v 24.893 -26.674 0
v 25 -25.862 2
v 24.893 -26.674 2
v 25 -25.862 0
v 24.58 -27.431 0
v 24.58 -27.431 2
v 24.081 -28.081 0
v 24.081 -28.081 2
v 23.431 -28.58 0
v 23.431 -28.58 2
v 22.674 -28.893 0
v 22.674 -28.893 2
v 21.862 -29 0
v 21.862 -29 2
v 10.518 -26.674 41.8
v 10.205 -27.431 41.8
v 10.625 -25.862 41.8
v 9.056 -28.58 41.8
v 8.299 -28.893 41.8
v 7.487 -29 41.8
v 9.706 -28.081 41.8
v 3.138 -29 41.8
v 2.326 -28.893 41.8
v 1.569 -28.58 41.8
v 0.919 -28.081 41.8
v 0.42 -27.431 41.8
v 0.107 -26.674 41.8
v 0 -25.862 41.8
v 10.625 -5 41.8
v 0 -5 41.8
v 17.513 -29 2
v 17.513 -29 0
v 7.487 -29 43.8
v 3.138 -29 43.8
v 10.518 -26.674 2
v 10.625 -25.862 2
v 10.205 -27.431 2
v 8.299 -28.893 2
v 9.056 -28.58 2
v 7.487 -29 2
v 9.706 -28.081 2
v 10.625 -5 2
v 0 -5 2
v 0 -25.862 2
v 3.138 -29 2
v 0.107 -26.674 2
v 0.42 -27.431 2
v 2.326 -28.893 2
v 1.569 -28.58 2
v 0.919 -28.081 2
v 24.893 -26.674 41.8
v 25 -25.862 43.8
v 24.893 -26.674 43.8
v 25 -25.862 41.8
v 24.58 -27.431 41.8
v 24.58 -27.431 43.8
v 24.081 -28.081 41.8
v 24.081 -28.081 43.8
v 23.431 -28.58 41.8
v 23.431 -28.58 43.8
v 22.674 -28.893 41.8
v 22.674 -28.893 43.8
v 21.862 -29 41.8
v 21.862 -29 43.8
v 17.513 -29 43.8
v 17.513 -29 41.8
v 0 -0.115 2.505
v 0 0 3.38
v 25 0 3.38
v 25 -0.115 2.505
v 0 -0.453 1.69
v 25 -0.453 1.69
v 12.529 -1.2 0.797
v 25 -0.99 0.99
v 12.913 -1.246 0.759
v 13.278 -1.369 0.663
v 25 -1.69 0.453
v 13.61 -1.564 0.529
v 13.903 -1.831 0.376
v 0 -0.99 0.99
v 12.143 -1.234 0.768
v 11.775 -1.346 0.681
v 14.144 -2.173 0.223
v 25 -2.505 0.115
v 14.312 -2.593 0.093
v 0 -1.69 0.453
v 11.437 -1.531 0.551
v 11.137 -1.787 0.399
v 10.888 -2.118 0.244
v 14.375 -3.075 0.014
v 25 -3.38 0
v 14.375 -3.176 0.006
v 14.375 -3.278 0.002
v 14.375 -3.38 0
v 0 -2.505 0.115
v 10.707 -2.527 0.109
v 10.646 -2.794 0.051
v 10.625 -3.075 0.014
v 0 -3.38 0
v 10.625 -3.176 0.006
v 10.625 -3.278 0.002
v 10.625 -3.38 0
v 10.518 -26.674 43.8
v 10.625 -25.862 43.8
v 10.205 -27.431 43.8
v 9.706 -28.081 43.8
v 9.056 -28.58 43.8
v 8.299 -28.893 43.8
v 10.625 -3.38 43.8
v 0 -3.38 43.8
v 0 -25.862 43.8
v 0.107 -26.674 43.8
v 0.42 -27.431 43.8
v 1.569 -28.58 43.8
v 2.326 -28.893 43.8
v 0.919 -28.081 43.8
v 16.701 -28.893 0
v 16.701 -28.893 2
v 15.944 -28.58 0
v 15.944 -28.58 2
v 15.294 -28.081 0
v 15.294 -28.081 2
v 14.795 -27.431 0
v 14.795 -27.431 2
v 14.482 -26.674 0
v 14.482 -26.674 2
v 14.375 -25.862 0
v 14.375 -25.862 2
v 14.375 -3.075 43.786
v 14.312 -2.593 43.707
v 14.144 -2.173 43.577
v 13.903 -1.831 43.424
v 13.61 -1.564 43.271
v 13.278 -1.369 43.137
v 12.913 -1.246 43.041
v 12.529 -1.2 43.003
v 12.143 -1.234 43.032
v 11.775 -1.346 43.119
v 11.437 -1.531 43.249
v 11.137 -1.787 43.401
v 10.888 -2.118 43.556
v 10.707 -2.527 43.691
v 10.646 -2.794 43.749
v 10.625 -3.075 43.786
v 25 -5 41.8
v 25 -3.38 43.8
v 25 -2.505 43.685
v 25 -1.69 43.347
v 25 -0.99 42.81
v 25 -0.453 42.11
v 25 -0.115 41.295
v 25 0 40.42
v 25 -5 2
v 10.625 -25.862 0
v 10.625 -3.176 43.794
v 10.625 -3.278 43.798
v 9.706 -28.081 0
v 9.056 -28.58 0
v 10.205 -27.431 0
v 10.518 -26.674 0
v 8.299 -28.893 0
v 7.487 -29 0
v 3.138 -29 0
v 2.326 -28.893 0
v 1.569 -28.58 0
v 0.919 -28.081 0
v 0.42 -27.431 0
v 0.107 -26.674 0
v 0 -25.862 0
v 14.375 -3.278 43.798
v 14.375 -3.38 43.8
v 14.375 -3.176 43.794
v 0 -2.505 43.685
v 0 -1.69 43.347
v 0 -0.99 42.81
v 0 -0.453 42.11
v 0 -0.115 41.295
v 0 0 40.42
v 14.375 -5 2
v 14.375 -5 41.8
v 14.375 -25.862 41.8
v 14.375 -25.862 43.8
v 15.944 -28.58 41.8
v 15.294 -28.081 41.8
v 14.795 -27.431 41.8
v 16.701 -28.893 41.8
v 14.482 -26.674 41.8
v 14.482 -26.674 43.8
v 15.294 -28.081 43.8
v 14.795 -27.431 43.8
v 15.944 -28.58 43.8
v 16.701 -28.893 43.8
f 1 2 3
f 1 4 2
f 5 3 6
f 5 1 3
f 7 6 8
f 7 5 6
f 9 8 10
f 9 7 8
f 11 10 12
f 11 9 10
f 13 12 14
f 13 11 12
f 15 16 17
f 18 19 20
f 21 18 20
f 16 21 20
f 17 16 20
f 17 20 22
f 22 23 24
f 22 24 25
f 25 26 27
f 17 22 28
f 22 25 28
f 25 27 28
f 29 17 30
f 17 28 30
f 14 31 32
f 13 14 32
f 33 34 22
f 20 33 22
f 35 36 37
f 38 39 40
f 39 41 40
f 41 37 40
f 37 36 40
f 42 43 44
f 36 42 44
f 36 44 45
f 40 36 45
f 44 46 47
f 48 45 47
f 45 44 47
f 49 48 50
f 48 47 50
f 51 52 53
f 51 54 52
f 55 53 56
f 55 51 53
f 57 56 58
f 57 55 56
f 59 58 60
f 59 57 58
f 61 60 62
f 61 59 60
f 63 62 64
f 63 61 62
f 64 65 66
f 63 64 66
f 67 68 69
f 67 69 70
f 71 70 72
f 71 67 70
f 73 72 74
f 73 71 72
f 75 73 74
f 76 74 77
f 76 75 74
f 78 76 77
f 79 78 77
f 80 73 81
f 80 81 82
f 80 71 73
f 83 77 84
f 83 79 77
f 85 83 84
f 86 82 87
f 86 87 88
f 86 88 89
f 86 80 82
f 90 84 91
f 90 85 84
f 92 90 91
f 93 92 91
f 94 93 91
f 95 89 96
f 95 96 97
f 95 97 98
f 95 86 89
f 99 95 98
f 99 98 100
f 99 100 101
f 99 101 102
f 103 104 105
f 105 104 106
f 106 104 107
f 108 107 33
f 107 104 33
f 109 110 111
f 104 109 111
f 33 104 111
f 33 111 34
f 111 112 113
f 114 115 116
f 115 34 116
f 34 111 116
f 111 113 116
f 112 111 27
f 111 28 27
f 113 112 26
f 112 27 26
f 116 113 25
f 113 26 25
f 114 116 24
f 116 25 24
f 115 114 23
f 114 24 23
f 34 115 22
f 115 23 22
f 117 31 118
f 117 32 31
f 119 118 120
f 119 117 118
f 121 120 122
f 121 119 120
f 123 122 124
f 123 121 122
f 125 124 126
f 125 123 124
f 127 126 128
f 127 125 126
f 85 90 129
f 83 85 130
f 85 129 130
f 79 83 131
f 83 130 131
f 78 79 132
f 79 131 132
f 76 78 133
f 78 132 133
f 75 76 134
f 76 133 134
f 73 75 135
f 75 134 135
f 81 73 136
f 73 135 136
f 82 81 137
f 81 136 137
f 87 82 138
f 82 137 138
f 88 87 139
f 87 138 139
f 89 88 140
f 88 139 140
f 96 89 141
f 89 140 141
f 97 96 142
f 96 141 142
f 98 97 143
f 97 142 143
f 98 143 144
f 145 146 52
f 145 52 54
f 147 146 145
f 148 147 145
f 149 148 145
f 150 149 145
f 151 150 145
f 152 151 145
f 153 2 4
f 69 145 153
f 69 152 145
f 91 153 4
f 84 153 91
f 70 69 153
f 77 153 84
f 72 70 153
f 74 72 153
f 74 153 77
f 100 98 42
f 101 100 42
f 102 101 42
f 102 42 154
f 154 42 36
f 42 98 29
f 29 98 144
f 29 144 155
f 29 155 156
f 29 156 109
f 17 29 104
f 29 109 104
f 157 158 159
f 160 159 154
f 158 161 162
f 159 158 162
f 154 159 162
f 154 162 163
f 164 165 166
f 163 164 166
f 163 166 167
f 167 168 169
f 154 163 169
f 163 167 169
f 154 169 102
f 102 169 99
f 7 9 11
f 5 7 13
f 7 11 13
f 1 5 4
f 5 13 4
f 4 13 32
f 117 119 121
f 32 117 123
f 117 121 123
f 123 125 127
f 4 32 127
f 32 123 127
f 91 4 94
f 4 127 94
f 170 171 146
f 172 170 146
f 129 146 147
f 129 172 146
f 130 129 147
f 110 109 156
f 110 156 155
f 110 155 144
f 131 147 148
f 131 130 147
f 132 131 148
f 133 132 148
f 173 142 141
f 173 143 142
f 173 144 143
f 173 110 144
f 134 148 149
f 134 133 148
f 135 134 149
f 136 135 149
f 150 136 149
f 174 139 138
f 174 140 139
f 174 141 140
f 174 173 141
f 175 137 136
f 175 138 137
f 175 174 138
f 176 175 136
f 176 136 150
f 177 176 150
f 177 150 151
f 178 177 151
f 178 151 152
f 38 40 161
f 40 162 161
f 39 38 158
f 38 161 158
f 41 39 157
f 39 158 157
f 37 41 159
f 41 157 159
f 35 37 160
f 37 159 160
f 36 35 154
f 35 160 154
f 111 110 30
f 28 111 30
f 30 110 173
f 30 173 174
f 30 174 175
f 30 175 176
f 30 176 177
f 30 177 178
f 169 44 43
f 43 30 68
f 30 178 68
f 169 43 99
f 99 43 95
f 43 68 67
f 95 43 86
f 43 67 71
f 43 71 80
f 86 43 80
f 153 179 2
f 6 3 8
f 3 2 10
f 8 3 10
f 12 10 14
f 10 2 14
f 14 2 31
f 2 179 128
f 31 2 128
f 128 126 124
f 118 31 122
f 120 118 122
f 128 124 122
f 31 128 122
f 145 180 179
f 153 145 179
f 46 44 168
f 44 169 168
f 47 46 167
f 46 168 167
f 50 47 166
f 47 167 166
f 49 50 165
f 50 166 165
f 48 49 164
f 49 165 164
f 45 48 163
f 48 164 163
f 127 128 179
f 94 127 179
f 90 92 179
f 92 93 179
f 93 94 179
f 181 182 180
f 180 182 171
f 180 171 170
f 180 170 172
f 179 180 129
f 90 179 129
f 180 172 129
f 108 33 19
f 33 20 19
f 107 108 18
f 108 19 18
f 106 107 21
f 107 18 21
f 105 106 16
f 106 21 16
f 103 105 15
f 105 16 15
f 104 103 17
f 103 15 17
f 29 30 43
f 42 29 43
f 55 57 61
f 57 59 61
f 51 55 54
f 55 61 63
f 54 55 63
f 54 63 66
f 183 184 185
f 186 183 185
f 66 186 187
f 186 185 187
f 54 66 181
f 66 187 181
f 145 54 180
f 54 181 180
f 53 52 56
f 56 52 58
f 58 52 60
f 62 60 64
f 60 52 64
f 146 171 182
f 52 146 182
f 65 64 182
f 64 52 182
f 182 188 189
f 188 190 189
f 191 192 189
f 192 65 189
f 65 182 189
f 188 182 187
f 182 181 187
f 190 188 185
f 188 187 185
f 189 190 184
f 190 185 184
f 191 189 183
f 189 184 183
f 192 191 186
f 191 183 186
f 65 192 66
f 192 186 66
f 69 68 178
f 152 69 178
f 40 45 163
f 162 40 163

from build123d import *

# Parameters (mm, degrees)
F1_DEPTH    = 25
F2_DEPTH    = 1
F4_DEPTH    = 47.5
F5_R        = 3.1384776311
F6_T1_DEPTH = 41.8994949366


# Not quite as in the source:
# - a fillet or chamfer that OpenCascade refuses, or shapes differently, is made with other operations: its cross-section is extruded or revolved along the edge and cut away or added


with BuildPart() as f1:
    # F0 (on Right) → F1 (new body)
    with BuildSketch(Plane.YZ):
        Polygon((0, 43.8), (-29, 43.8), (-29, 41.8), (-4, 41.8), (-4, 2), (-29, 2), (-29, 0), (0, 0), align=None)
    extrude(amount=F1_DEPTH)

    # F2 (add): a face of the model
    f2_faces = [f1.faces().sort_by_distance(p)[0] for p in [
        (12.5, -4, 21.9),
    ]]
    extrude(f2_faces, amount=F2_DEPTH)

    # F3 (on face) → F4 (cut)
    with BuildSketch(Plane.XY.offset(43.8)):
        with BuildLine():
            Line((12.5, -3.075), (14.375, -3.075))
            ThreePointArc((14.375, -3.075), (12.5, -1.2), (10.625, -3.075))
            Line((10.625, -3.075), (12.5, -3.075))
        make_face()
        with BuildLine():
            Line((14.375, -29), (14.375, -3.075))
            ThreePointArc((14.375, -3.075), (12.5, -4.95), (10.625, -3.075))
            Line((10.625, -3.075), (10.625, -29))
            Line((10.625, -29), (14.375, -29))
        make_face()
        with BuildLine():
            ThreePointArc((10.625, -3.075), (12.5, -4.95), (14.375, -3.075))
            Line((14.375, -3.075), (12.5, -3.075))
            Line((12.5, -3.075), (10.625, -3.075))
        make_face()
    extrude(amount=-F4_DEPTH, mode=Mode.SUBTRACT)

    # F5
    f5_edges = [f1.edges().sort_by_distance(p)[0] for p in [
        (0, -29, 42.8),
        (10.625, -29, 42.8),
        (14.375, -29, 42.8),
        (25, -29, 42.8),
        (25, -29, 1),
        (14.375, -29, 1),
        (10.625, -29, 1),
        (0, -29, 1),
    ]]
    fillet(f5_edges, radius=F5_R)

    # F6: fillet of radius 3.3798989873 on 2 edges, made by hand

    # F6_s2 → F6_t1 (cut)
    with BuildSketch(Plane.YZ.offset(-8.4497474683)):
        with BuildLine():
            ThreePointArc((-3.3798989873, 43.8), (-0.9899494937, 42.8100505063), (0, 40.4201010127))
            Line((0, 40.4201010127), (0, 43.8))
            Line((0, 43.8), (-3.3798989873, 43.8))
        make_face()
        with BuildLine():
            ThreePointArc((0, 3.3798989873), (-0.9899494937, 0.9899494937), (-3.3798989873, 0))
            Line((-3.3798989873, 0), (0, 0))
            Line((0, 0), (0, 3.3798989873))
        make_face()
    extrude(amount=F6_T1_DEPTH, mode=Mode.SUBTRACT)


solid = f1.part
